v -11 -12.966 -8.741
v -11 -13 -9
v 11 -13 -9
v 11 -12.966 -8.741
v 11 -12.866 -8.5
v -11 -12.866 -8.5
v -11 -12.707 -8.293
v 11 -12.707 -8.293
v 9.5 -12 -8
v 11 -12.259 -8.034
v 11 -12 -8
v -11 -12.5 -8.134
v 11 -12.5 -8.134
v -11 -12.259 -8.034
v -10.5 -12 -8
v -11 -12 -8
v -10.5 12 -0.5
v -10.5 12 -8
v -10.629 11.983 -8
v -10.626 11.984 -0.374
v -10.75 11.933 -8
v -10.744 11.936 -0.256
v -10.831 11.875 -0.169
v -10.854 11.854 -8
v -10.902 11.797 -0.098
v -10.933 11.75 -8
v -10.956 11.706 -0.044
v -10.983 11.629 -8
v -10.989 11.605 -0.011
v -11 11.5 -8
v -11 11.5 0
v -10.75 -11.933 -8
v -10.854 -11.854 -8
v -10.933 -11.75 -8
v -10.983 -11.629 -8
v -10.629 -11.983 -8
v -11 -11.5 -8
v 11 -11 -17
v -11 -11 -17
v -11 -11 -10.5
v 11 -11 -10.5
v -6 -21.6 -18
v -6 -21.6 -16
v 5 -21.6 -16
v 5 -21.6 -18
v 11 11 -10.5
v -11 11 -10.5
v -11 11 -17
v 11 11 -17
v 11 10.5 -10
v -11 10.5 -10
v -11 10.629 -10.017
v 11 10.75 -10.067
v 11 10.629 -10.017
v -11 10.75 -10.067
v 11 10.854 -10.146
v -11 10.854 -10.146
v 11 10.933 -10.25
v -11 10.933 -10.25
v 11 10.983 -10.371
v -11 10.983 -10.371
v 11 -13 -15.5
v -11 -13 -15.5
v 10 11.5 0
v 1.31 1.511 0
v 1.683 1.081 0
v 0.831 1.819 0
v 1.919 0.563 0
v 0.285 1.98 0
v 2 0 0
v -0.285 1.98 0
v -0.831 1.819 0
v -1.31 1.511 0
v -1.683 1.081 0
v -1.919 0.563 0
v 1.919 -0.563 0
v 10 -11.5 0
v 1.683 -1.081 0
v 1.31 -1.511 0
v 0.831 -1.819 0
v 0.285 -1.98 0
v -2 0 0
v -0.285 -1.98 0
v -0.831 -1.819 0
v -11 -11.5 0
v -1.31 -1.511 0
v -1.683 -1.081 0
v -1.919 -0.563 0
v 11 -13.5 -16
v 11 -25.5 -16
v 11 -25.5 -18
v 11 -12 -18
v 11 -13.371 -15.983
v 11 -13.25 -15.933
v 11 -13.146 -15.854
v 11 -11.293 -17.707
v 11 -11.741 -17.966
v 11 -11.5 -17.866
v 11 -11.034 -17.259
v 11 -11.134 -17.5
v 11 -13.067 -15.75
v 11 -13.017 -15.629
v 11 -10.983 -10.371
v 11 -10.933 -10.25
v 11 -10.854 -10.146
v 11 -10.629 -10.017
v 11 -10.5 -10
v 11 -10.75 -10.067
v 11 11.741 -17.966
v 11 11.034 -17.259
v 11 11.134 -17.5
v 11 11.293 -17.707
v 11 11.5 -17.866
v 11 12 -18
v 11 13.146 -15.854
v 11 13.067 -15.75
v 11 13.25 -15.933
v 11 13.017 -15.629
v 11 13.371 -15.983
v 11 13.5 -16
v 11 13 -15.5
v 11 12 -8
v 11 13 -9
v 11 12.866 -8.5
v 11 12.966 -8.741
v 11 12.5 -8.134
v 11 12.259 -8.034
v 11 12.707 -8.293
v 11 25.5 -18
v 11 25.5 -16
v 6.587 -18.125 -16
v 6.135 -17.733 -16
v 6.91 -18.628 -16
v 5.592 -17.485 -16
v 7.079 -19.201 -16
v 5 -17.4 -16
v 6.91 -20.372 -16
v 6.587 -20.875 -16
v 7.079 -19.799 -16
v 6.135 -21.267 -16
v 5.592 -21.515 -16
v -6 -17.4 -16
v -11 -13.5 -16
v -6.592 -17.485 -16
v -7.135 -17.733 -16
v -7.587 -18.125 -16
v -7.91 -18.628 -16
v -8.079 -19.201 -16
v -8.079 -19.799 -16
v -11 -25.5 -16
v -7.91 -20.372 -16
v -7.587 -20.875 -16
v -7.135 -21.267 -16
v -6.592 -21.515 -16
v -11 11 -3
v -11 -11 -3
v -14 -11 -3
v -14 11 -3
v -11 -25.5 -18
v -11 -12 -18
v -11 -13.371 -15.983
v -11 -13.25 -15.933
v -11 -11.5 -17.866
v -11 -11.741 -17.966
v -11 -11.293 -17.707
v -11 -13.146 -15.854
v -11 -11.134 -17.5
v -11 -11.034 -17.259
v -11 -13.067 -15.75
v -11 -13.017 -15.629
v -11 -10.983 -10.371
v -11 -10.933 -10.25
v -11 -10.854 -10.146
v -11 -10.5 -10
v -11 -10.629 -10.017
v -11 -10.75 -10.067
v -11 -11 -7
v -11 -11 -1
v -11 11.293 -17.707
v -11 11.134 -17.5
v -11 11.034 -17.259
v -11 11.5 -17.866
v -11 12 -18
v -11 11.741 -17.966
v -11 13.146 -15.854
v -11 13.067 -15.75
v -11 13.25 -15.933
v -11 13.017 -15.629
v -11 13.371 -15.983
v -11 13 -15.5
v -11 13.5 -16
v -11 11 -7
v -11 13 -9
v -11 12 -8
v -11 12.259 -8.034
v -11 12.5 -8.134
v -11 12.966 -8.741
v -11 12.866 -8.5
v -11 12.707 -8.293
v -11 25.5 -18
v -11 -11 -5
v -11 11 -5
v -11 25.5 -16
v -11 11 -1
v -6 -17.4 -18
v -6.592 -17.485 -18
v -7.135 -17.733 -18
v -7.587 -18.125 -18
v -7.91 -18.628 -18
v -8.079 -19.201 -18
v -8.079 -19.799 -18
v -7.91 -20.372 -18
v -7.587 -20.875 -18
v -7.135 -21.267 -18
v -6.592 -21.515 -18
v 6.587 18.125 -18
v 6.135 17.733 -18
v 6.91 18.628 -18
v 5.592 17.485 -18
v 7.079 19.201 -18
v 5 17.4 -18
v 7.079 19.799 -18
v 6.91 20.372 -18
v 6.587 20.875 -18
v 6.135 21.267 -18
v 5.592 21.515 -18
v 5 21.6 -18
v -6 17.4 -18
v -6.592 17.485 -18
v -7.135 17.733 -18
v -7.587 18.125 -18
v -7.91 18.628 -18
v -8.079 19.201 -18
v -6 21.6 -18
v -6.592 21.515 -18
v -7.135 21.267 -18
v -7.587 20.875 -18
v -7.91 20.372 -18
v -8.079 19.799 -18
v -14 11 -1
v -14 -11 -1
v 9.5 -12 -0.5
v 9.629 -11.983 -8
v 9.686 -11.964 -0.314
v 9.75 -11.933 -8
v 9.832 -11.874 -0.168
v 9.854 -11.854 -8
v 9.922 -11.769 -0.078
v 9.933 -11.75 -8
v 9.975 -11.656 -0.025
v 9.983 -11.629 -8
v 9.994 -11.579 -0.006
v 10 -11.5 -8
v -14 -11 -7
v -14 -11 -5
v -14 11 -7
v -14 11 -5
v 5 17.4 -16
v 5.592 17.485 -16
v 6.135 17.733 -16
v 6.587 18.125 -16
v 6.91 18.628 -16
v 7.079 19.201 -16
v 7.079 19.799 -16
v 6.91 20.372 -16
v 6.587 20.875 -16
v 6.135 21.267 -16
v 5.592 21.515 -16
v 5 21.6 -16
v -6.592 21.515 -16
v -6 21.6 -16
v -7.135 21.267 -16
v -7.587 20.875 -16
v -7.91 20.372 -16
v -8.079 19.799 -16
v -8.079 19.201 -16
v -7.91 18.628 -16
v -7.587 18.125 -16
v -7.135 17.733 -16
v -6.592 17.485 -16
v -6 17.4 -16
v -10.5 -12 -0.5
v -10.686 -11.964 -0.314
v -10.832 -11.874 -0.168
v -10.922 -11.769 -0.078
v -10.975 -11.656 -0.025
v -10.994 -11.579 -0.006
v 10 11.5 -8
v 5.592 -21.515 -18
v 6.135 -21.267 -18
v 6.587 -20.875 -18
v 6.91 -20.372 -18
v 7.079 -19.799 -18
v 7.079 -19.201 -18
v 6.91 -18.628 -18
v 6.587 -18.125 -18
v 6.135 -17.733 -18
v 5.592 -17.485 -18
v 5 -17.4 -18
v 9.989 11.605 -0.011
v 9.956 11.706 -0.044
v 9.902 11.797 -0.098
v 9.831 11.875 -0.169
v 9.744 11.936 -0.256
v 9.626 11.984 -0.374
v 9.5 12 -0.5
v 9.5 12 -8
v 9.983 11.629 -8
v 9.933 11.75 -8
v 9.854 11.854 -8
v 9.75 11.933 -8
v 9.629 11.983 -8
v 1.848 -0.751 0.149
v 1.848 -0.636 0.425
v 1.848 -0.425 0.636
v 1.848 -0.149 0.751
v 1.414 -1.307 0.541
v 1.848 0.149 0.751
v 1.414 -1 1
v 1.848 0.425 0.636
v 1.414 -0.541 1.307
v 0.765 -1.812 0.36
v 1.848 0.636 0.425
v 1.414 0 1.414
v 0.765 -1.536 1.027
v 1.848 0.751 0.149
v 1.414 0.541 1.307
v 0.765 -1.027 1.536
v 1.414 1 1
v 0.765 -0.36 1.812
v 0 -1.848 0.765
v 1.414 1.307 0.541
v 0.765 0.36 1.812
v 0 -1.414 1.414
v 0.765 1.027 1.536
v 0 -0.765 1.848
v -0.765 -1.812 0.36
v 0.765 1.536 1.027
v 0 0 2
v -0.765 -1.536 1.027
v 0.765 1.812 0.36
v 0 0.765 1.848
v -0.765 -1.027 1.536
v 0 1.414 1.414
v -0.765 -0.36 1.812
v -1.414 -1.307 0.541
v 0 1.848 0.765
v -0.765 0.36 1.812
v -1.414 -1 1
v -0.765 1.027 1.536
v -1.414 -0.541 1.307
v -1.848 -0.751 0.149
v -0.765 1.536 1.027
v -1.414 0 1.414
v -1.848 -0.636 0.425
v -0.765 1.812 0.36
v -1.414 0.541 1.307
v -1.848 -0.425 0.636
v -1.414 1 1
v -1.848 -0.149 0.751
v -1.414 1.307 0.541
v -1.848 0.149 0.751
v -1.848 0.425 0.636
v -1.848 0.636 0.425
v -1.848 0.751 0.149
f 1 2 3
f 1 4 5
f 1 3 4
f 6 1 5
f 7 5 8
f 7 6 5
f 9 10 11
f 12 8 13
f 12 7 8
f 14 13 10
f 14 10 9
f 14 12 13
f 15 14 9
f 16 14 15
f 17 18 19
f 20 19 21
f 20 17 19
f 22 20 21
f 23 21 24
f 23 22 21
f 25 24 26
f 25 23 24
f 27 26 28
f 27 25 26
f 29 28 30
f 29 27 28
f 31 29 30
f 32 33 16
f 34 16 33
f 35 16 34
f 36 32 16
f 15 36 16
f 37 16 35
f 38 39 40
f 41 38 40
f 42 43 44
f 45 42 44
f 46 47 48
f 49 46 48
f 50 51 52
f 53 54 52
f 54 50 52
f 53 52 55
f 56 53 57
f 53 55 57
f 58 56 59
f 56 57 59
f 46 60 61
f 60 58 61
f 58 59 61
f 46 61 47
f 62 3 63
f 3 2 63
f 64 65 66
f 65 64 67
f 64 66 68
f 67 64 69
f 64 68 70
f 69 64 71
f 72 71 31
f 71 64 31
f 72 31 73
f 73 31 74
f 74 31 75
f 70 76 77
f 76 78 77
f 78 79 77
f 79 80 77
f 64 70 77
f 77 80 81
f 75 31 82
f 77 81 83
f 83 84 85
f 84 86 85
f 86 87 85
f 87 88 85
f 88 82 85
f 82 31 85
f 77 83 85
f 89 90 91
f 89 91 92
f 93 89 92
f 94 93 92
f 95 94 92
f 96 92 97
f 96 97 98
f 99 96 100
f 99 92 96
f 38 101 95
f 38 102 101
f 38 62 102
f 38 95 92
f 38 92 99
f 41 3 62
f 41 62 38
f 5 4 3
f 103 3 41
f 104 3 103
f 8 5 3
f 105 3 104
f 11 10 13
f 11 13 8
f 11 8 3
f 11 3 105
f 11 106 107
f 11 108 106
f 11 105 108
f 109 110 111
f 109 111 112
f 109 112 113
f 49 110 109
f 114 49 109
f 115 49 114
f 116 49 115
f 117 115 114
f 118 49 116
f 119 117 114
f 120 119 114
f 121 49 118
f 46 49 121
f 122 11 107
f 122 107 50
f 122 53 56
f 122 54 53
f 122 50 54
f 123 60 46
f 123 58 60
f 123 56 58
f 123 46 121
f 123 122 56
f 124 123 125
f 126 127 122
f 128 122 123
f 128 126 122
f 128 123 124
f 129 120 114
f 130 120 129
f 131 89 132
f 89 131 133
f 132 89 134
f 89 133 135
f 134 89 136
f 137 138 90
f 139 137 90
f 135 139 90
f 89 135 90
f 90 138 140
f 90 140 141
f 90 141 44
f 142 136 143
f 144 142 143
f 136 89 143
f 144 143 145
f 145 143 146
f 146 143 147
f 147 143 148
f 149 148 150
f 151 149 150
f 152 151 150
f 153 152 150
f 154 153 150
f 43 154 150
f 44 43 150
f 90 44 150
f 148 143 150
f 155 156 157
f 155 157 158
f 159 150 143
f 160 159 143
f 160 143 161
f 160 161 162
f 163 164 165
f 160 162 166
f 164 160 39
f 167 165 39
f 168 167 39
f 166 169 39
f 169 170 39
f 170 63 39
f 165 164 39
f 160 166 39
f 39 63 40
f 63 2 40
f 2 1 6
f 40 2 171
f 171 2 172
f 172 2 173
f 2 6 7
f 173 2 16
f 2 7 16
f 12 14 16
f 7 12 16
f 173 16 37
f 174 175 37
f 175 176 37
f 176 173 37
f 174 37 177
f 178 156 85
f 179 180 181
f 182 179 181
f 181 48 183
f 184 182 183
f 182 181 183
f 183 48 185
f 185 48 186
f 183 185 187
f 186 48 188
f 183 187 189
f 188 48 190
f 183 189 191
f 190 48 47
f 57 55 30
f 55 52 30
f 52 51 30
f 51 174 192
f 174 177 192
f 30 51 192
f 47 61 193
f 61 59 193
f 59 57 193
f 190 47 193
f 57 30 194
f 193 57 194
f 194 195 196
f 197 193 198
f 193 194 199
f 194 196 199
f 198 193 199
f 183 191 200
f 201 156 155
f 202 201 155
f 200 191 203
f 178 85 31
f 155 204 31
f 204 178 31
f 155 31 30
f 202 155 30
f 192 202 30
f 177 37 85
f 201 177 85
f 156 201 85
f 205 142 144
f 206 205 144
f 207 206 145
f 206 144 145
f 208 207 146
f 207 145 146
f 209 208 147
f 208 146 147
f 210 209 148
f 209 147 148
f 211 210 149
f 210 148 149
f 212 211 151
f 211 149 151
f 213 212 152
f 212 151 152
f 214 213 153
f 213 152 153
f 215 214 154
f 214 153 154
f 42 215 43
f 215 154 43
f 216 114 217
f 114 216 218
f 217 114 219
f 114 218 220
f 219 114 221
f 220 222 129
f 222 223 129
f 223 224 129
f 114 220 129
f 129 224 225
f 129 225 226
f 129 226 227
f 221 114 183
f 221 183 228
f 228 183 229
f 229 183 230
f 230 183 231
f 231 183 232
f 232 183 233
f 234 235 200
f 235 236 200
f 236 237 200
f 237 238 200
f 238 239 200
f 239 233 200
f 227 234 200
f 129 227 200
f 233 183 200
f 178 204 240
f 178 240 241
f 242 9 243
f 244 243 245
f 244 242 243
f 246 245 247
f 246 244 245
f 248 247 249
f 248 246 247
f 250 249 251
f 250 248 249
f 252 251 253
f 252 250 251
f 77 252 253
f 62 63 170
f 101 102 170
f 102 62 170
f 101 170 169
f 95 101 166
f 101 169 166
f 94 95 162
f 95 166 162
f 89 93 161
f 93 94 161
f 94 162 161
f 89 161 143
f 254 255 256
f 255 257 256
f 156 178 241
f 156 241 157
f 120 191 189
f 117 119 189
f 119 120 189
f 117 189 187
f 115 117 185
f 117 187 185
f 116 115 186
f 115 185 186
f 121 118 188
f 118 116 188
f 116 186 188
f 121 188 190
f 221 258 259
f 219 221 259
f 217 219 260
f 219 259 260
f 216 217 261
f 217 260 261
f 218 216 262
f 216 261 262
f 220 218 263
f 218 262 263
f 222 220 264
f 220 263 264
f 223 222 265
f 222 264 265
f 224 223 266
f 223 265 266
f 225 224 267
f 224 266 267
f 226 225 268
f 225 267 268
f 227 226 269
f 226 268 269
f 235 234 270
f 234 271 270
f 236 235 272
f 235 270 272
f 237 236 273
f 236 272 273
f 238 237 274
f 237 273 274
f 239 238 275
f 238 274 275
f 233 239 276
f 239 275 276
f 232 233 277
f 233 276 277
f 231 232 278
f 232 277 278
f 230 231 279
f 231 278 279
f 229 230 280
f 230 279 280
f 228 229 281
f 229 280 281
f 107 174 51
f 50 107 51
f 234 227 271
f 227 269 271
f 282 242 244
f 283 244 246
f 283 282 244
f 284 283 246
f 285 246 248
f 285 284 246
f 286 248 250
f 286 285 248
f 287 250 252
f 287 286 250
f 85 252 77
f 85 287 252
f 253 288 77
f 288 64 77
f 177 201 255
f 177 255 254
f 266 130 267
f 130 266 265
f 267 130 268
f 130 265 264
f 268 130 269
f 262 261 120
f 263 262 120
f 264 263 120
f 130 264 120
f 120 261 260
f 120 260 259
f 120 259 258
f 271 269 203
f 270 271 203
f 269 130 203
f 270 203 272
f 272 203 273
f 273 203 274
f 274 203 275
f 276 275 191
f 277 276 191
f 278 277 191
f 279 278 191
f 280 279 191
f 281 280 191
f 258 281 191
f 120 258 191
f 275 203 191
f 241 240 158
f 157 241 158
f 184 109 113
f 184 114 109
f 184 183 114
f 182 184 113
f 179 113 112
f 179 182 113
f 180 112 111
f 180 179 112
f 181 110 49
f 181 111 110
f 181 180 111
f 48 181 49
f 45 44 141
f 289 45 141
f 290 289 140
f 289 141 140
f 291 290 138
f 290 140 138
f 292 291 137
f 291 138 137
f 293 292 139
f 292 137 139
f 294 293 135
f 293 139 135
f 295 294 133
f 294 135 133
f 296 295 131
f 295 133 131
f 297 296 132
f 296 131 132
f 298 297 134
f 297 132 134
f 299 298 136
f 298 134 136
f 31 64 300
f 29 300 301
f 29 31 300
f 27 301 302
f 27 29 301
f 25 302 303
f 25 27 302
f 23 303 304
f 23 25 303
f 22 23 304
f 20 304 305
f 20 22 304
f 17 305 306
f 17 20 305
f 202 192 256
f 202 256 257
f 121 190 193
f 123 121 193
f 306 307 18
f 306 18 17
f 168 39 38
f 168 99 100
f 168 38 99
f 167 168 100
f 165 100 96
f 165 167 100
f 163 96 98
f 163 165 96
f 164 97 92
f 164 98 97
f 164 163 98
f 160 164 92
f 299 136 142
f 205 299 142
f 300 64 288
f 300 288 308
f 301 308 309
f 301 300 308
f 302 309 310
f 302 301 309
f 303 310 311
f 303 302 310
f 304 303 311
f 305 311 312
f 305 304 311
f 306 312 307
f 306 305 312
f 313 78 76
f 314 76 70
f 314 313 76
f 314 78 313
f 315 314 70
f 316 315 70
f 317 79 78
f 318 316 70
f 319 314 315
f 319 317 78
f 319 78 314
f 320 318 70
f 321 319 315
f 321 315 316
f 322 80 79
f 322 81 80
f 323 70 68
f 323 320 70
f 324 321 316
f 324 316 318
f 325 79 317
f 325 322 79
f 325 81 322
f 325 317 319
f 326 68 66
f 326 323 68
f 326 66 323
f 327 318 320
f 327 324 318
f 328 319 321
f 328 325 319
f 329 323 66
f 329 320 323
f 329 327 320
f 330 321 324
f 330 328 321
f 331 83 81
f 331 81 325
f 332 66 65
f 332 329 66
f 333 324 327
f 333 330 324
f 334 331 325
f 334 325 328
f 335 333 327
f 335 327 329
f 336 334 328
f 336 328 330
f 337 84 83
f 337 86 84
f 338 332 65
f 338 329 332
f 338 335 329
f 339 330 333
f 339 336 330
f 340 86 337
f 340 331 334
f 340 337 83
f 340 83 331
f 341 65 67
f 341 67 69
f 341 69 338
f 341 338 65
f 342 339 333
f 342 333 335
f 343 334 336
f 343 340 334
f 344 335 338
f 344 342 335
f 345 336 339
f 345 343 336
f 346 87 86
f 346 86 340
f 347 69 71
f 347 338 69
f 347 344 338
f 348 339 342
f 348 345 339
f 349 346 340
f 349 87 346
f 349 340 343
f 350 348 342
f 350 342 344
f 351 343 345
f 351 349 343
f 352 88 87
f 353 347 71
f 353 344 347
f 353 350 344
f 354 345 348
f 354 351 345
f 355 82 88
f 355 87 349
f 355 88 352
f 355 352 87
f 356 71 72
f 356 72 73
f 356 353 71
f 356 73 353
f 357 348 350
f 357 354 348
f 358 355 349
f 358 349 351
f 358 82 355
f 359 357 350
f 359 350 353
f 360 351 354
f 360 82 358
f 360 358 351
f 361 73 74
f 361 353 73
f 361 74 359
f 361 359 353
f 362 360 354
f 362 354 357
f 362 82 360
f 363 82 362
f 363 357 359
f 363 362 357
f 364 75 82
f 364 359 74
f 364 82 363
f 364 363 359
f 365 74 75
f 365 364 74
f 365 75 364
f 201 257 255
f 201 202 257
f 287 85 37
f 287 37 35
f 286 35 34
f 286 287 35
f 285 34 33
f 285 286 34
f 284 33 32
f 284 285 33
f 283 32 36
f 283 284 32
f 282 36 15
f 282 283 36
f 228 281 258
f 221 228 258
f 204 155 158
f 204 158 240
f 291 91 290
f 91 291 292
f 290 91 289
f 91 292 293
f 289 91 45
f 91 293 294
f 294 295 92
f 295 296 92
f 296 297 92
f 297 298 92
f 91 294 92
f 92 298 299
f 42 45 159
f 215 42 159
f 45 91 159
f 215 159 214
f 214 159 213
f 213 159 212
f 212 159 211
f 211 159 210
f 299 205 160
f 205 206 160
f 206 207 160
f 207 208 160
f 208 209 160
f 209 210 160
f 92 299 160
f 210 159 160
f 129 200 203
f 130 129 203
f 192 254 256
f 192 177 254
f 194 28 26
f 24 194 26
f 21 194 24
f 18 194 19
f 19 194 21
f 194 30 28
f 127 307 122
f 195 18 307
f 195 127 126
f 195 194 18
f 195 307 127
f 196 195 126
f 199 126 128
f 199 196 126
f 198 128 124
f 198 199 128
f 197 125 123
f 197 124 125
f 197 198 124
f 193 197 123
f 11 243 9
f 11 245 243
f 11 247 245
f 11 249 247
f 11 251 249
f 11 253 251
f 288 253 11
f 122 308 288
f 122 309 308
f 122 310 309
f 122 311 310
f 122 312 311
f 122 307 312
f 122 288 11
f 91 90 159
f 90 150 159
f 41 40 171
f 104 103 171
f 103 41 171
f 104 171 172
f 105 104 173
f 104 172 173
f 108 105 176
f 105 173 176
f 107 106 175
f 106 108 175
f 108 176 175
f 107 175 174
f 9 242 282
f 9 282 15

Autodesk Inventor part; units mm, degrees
sketch "Sketch_1" plane through (0, 0, 0) normal (1, 0, 0) x (0, 1, 0)
  arc A0 (-11.5, 0) -> (-12, -0.5) centre (-11.5, -0.5) ccw
  line L0 (-12, -0.5) -> (-12, -8)
  arc A1 (-12, -8) -> (-13, -9) centre (-12, -9) ccw
  line L1 (-13, -9) -> (-13, -15.5)
  arc A2 (-13.5, -16) -> (-13, -15.5) centre (-13.5, -15.5) ccw
  line L2 (-13.5, -16) -> (-25.5, -16)
  line L3 (-25.5, -16) -> (-25.5, -18)
  line L4 (-25.5, -18) -> (-12, -18)
  arc A3 (-12, -18) -> (-11, -17) centre (-12, -17) ccw
  line L5 (-11, -17) -> (-11, -10.5)
  arc A4 (-10.5, -10) -> (-11, -10.5) centre (-10.5, -10.5) ccw
  line L6 (-10.5, -10) -> (10.5, -10)
  arc A5 (11, -10.5) -> (10.5, -10) centre (10.5, -10.5) ccw
  line L7 (11, -10.5) -> (11, -17)
  arc A6 (11, -17) -> (12, -18) centre (12, -17) ccw
  line L8 (12, -18) -> (25.5, -18)
  line L9 (25.5, -18) -> (25.5, -16)
  line L10 (25.5, -16) -> (13.5, -16)
  arc A7 (13, -15.5) -> (13.5, -16) centre (13.5, -15.5) ccw
  line L11 (13, -15.5) -> (13, -9)
  arc A8 (13, -9) -> (12, -8) centre (12, -9) ccw
  line L12 (12, -8) -> (12, -0.5)
  arc A9 (12, -0.5) -> (11.5, 0) centre (11.5, -0.5) ccw
  line L13 (11.5, 0) -> (-11.5, 0)
extrude "Extrusion1" add sketch "Sketch_1" along normal mid plane 22
sketch "Sketch_2" plane through (0, 0, 0) normal (0, 0, 1) x (1, 0, 0)
  line L0 (10, 12) -> (10, -12)
  line L1 (10, -12) -> (11, -12)
  line L2 (11, -12) -> (11, 12)
  line L3 (11, 12) -> (10, 12)
extrude "Extrusion2" cut sketch "Sketch_2" against normal blind 8
sketch "Sketch_3" plane through (0, 0, 0) normal (0, 0, 1) x (1, 0, 0)
  line L0 (50, 0) -> (-50, 0)
  arc A0 (2, 0) -> (-2, 0) centre (0, 0) ccw
  line L1 (2, 0) -> (-2, 0)
revolve "Revolution1" add sketch "Sketch_3" angle 360 about axis through (50, 0, 0) along (1, 0, 0)
sketch "Sketch_6" plane through (0, 0, 0) normal (0, 0, 1) x (1, 0, 0)
  line L0 (-24, 24) -> (-24, -24)
  line L1 (-24, -24) -> (24, -24)
  line L2 (24, -24) -> (24, 24)
  line L3 (24, 24) -> (-24, 24)
  line L4 (-11, 11.5) -> (-11, -11.5)
  arc A0 (-11, -11.5) -> (-10.5, -12) centre (-10.5, -11.5) ccw
  line L5 (-10.5, -12) -> (9.5, -12)
  arc A1 (9.5, -12) -> (10, -11.5) centre (9.5, -11.5) ccw
  line L6 (10, -11.5) -> (10, 11.5)
  arc A2 (10, 11.5) -> (9.5, 12) centre (9.5, 11.5) ccw
  line L7 (9.5, 12) -> (-10.5, 12)
  arc A3 (-10.5, 12) -> (-11, 11.5) centre (-10.5, 11.5) ccw
extrude "Extrusion3" cut sketch "Sketch_6" against normal blind 8
sketch "Sketch_4" plane through (-11, 0, 0) normal (1, 0, 0) x (0, 0, -1)
  line L0 (1, 11) -> (1, -11)
  line L1 (1, -11) -> (3, -11)
  line L2 (3, -11) -> (3, 11)
  line L3 (3, 11) -> (1, 11)
extrude "Extrusion4" add sketch "Sketch_4" against normal blind 3
sketch "Sketch_5" plane through (-11, 0, 0) normal (1, 0, 0) x (0, 0, -1)
  line L0 (5, -11) -> (7, -11)
  line L1 (7, -11) -> (7, 11)
  line L2 (7, 11) -> (5, 11)
  line L3 (5, 11) -> (5, -11)
extrude "Extrusion5" add sketch "Sketch_5" against normal blind 3
sketch "Sketch_7" plane through (0, 0, 0) normal (0, 0, 1) x (1, 0, 0)
  arc A0 (-6, 21.6) -> (-6, 17.4) centre (-6, 19.5) ccw
  line L0 (-6, 17.4) -> (5, 17.4)
  arc A1 (5, 17.4) -> (5, 21.6) centre (5, 19.5) ccw
  line L1 (5, 21.6) -> (-6, 21.6)
extrude "Extrusion6" cut sketch "Sketch_7" against normal blind 20
sketch "Sketch_8" plane through (0, 0, 0) normal (0, 0, 1) x (1, 0, 0)
  arc A0 (-6, -17.4) -> (-6, -21.6) centre (-6, -19.5) ccw
  line L0 (-6, -21.6) -> (5, -21.6)
  arc A1 (5, -21.6) -> (5, -17.4) centre (5, -19.5) ccw
  line L1 (5, -17.4) -> (-6, -17.4)
extrude "Extrusion7" cut sketch "Sketch_8" against normal blind 20
ref_plane "magnet_dummy_XY" through (0, 0, 0) normal (0, 0, 1) x (1, 0, 0)
ref_plane "magnet_dummy_YZ" through (0, 0, 0) normal (1, 0, 0) x (0, 1, 0)
ref_plane "magnet_dummy_ZX" through (0, 0, 0) normal (0, 1, 0) x (0, 0, 1)
ref_plane "to_ap_plate_XY" through (-9.1, 26, 0) normal (0, 0, -1) x (1, 0, 0)
ref_plane "to_ap_plate_YZ" through (-9.1, 26, 0) normal (1, 0, 0) x (0, -1, 0)
ref_plane "to_ap_plate_ZX" through (-9.1, 26, 0) normal (0, -1, 0) x (0, 0, -1)
ref_plane "to_door_side_plate_XY" through (-14, 0, -6) normal (1, 0, 0) x (0, 0, -1)
ref_plane "to_door_side_plate_YZ" through (-14, 0, -6) normal (0, 0, -1) x (0, 1, 0)
ref_plane "to_door_side_plate_ZX" through (-14, 0, -6) normal (0, 1, 0) x (1, 0, 0)
ref_plane "to_ap_plate1_XY" through (-1, 19.5, -18) normal (0, 0, 1) x (1, 0, 0)
ref_plane "to_ap_plate1_YZ" through (-1, 19.5, -18) normal (1, 0, 0) x (0, 1, 0)
ref_plane "to_ap_plate1_ZX" through (-1, 19.5, -18) normal (0, 1, 0) x (0, 0, 1)
ref_plane "to_ap_plate2_XY" through (-1, -19.5, -18) normal (0, 0, 1) x (1, 0, 0)
ref_plane "to_ap_plate2_YZ" through (-1, -19.5, -18) normal (1, 0, 0) x (0, 1, 0)
ref_plane "to_ap_plate2_ZX" through (-1, -19.5, -18) normal (0, 1, 0) x (0, 0, 1)
ref_plane "x1_XY" through (-9.2, 26, -15) normal (0, 0, -1) x (1, 0, 0)
ref_plane "x1_YZ" through (-9.2, 26, -15) normal (1, 0, 0) x (0, -1, 0)
ref_plane "x1_ZX" through (-9.2, 26, -15) normal (0, -1, 0) x (0, 0, -1)
ref_plane "x2_XY" through (-9.2, -26, -15) normal (0, 0, -1) x (1, 0, 0)
ref_plane "x2_YZ" through (-9.2, -26, -15) normal (1, 0, 0) x (0, -1, 0)
ref_plane "x2_ZX" through (-9.2, -26, -15) normal (0, -1, 0) x (0, 0, -1)
ref_plane "magnet_to_dummy2_XY" through (0, 0, -15) normal (0, 0, 1) x (1, 0, 0)
ref_plane "magnet_to_dummy2_YZ" through (0, 0, -15) normal (1, 0, 0) x (0, 1, 0)
ref_plane "magnet_to_dummy2_ZX" through (0, 0, -15) normal (0, 1, 0) x (0, 0, 1)
ref_plane "xy1_XY" through (-9.5, -26, 0) normal (0, 0, 1) x (1, 0, 0)
ref_plane "xy1_YZ" through (-9.5, -26, 0) normal (1, 0, 0) x (0, 1, 0)
ref_plane "xy1_ZX" through (-9.5, -26, 0) normal (0, 1, 0) x (0, 0, 1)
ref_plane "x22_XY" through (-9.1, -26, -7.5) normal (0, 0, -1) x (1, 0, 0)
ref_plane "x22_YZ" through (-9.1, -26, -7.5) normal (1, 0, 0) x (0, -1, 0)
ref_plane "x22_ZX" through (-9.1, -26, -7.5) normal (0, -1, 0) x (0, 0, -1)
ref_plane "to_ap_platexxx_XY" through (-9.1, 26, 0) normal (0, 0, -1) x (1, 0, 0)
ref_plane "to_ap_platexxx_YZ" through (-9.1, 26, 0) normal (1, 0, 0) x (0, -1, 0)
ref_plane "to_ap_platexxx_ZX" through (-9.1, 26, 0) normal (0, -1, 0) x (0, 0, -1)
ref_plane "to_ap_plate3_XY" through (-1, -19.5, -18) normal (0, 0, 1) x (1, 0, 0)
ref_plane "to_ap_plate3_YZ" through (-1, -19.5, -18) normal (1, 0, 0) x (0, 1, 0)
ref_plane "to_ap_plate3_ZX" through (-1, -19.5, -18) normal (0, 1, 0) x (0, 0, 1)
ref_plane "magnet_to_plate_XY" through (0, 19.5, -18) normal (1, 0, 0) x (0, 0, -1)
ref_plane "magnet_to_plate_YZ" through (0, 19.5, -18) normal (0, 0, -1) x (0, 1, 0)
ref_plane "magnet_to_plate_ZX" through (0, 19.5, -18) normal (0, 1, 0) x (1, 0, 0)
ref_plane "to_plate_XY" through (-9.1, 26, -15) normal (0, 0, -1) x (1, 0, 0)
ref_plane "to_plate_YZ" through (-9.1, 26, -15) normal (1, 0, 0) x (0, -1, 0)
ref_plane "to_plate_ZX" through (-9.1, 26, -15) normal (0, -1, 0) x (0, 0, -1)
ref_plane "to_pwf_bolt_XY" through (-9.1, 26, 0) normal (0, 0, -1) x (1, 0, 0)
ref_plane "to_pwf_bolt_YZ" through (-9.1, 26, 0) normal (1, 0, 0) x (0, -1, 0)
ref_plane "to_pwf_bolt_ZX" through (-9.1, 26, 0) normal (0, -1, 0) x (0, 0, -1)
ref_plane "to_pwf_bolt_1_XY" through (-9.1, -26, 0) normal (0, 0, -1) x (1, 0, 0)
ref_plane "to_pwf_bolt_1_YZ" through (-9.1, -26, 0) normal (1, 0, 0) x (0, -1, 0)
ref_plane "to_pwf_bolt_1_ZX" through (-9.1, -26, 0) normal (0, -1, 0) x (0, 0, -1)
ref_plane "washer_1_XY" through (-9.2, 26, 0) normal (0, 0, -1) x (1, 0, 0)
ref_plane "washer_1_YZ" through (-9.2, 26, 0) normal (1, 0, 0) x (0, -1, 0)
ref_plane "washer_1_ZX" through (-9.2, 26, 0) normal (0, -1, 0) x (0, 0, -1)
ref_plane "washer_2_XY" through (-9.2, -26, 0) normal (0, 0, -1) x (1, 0, 0)
ref_plane "washer_2_YZ" through (-9.2, -26, 0) normal (1, 0, 0) x (0, -1, 0)
ref_plane "washer_2_ZX" through (-9.2, -26, 0) normal (0, -1, 0) x (0, 0, -1)
ref_plane "pmf_1_XY" through (-9.2, 26, 0.8) normal (0, 0, -1) x (1, 0, 0)
ref_plane "pmf_1_YZ" through (-9.2, 26, 0.8) normal (1, 0, 0) x (0, -1, 0)
ref_plane "pmf_1_ZX" through (-9.2, 26, 0.8) normal (0, -1, 0) x (0, 0, -1)
ref_plane "pmf_2_XY" through (-9.2, -26, 0.8) normal (0, 0, -1) x (1, 0, 0)
ref_plane "pmf_2_YZ" through (-9.2, -26, 0.8) normal (1, 0, 0) x (0, -1, 0)
ref_plane "pmf_2_ZX" through (-9.2, -26, 0.8) normal (0, -1, 0) x (0, 0, -1)
properties part number "HMEN5-5-magnet"
